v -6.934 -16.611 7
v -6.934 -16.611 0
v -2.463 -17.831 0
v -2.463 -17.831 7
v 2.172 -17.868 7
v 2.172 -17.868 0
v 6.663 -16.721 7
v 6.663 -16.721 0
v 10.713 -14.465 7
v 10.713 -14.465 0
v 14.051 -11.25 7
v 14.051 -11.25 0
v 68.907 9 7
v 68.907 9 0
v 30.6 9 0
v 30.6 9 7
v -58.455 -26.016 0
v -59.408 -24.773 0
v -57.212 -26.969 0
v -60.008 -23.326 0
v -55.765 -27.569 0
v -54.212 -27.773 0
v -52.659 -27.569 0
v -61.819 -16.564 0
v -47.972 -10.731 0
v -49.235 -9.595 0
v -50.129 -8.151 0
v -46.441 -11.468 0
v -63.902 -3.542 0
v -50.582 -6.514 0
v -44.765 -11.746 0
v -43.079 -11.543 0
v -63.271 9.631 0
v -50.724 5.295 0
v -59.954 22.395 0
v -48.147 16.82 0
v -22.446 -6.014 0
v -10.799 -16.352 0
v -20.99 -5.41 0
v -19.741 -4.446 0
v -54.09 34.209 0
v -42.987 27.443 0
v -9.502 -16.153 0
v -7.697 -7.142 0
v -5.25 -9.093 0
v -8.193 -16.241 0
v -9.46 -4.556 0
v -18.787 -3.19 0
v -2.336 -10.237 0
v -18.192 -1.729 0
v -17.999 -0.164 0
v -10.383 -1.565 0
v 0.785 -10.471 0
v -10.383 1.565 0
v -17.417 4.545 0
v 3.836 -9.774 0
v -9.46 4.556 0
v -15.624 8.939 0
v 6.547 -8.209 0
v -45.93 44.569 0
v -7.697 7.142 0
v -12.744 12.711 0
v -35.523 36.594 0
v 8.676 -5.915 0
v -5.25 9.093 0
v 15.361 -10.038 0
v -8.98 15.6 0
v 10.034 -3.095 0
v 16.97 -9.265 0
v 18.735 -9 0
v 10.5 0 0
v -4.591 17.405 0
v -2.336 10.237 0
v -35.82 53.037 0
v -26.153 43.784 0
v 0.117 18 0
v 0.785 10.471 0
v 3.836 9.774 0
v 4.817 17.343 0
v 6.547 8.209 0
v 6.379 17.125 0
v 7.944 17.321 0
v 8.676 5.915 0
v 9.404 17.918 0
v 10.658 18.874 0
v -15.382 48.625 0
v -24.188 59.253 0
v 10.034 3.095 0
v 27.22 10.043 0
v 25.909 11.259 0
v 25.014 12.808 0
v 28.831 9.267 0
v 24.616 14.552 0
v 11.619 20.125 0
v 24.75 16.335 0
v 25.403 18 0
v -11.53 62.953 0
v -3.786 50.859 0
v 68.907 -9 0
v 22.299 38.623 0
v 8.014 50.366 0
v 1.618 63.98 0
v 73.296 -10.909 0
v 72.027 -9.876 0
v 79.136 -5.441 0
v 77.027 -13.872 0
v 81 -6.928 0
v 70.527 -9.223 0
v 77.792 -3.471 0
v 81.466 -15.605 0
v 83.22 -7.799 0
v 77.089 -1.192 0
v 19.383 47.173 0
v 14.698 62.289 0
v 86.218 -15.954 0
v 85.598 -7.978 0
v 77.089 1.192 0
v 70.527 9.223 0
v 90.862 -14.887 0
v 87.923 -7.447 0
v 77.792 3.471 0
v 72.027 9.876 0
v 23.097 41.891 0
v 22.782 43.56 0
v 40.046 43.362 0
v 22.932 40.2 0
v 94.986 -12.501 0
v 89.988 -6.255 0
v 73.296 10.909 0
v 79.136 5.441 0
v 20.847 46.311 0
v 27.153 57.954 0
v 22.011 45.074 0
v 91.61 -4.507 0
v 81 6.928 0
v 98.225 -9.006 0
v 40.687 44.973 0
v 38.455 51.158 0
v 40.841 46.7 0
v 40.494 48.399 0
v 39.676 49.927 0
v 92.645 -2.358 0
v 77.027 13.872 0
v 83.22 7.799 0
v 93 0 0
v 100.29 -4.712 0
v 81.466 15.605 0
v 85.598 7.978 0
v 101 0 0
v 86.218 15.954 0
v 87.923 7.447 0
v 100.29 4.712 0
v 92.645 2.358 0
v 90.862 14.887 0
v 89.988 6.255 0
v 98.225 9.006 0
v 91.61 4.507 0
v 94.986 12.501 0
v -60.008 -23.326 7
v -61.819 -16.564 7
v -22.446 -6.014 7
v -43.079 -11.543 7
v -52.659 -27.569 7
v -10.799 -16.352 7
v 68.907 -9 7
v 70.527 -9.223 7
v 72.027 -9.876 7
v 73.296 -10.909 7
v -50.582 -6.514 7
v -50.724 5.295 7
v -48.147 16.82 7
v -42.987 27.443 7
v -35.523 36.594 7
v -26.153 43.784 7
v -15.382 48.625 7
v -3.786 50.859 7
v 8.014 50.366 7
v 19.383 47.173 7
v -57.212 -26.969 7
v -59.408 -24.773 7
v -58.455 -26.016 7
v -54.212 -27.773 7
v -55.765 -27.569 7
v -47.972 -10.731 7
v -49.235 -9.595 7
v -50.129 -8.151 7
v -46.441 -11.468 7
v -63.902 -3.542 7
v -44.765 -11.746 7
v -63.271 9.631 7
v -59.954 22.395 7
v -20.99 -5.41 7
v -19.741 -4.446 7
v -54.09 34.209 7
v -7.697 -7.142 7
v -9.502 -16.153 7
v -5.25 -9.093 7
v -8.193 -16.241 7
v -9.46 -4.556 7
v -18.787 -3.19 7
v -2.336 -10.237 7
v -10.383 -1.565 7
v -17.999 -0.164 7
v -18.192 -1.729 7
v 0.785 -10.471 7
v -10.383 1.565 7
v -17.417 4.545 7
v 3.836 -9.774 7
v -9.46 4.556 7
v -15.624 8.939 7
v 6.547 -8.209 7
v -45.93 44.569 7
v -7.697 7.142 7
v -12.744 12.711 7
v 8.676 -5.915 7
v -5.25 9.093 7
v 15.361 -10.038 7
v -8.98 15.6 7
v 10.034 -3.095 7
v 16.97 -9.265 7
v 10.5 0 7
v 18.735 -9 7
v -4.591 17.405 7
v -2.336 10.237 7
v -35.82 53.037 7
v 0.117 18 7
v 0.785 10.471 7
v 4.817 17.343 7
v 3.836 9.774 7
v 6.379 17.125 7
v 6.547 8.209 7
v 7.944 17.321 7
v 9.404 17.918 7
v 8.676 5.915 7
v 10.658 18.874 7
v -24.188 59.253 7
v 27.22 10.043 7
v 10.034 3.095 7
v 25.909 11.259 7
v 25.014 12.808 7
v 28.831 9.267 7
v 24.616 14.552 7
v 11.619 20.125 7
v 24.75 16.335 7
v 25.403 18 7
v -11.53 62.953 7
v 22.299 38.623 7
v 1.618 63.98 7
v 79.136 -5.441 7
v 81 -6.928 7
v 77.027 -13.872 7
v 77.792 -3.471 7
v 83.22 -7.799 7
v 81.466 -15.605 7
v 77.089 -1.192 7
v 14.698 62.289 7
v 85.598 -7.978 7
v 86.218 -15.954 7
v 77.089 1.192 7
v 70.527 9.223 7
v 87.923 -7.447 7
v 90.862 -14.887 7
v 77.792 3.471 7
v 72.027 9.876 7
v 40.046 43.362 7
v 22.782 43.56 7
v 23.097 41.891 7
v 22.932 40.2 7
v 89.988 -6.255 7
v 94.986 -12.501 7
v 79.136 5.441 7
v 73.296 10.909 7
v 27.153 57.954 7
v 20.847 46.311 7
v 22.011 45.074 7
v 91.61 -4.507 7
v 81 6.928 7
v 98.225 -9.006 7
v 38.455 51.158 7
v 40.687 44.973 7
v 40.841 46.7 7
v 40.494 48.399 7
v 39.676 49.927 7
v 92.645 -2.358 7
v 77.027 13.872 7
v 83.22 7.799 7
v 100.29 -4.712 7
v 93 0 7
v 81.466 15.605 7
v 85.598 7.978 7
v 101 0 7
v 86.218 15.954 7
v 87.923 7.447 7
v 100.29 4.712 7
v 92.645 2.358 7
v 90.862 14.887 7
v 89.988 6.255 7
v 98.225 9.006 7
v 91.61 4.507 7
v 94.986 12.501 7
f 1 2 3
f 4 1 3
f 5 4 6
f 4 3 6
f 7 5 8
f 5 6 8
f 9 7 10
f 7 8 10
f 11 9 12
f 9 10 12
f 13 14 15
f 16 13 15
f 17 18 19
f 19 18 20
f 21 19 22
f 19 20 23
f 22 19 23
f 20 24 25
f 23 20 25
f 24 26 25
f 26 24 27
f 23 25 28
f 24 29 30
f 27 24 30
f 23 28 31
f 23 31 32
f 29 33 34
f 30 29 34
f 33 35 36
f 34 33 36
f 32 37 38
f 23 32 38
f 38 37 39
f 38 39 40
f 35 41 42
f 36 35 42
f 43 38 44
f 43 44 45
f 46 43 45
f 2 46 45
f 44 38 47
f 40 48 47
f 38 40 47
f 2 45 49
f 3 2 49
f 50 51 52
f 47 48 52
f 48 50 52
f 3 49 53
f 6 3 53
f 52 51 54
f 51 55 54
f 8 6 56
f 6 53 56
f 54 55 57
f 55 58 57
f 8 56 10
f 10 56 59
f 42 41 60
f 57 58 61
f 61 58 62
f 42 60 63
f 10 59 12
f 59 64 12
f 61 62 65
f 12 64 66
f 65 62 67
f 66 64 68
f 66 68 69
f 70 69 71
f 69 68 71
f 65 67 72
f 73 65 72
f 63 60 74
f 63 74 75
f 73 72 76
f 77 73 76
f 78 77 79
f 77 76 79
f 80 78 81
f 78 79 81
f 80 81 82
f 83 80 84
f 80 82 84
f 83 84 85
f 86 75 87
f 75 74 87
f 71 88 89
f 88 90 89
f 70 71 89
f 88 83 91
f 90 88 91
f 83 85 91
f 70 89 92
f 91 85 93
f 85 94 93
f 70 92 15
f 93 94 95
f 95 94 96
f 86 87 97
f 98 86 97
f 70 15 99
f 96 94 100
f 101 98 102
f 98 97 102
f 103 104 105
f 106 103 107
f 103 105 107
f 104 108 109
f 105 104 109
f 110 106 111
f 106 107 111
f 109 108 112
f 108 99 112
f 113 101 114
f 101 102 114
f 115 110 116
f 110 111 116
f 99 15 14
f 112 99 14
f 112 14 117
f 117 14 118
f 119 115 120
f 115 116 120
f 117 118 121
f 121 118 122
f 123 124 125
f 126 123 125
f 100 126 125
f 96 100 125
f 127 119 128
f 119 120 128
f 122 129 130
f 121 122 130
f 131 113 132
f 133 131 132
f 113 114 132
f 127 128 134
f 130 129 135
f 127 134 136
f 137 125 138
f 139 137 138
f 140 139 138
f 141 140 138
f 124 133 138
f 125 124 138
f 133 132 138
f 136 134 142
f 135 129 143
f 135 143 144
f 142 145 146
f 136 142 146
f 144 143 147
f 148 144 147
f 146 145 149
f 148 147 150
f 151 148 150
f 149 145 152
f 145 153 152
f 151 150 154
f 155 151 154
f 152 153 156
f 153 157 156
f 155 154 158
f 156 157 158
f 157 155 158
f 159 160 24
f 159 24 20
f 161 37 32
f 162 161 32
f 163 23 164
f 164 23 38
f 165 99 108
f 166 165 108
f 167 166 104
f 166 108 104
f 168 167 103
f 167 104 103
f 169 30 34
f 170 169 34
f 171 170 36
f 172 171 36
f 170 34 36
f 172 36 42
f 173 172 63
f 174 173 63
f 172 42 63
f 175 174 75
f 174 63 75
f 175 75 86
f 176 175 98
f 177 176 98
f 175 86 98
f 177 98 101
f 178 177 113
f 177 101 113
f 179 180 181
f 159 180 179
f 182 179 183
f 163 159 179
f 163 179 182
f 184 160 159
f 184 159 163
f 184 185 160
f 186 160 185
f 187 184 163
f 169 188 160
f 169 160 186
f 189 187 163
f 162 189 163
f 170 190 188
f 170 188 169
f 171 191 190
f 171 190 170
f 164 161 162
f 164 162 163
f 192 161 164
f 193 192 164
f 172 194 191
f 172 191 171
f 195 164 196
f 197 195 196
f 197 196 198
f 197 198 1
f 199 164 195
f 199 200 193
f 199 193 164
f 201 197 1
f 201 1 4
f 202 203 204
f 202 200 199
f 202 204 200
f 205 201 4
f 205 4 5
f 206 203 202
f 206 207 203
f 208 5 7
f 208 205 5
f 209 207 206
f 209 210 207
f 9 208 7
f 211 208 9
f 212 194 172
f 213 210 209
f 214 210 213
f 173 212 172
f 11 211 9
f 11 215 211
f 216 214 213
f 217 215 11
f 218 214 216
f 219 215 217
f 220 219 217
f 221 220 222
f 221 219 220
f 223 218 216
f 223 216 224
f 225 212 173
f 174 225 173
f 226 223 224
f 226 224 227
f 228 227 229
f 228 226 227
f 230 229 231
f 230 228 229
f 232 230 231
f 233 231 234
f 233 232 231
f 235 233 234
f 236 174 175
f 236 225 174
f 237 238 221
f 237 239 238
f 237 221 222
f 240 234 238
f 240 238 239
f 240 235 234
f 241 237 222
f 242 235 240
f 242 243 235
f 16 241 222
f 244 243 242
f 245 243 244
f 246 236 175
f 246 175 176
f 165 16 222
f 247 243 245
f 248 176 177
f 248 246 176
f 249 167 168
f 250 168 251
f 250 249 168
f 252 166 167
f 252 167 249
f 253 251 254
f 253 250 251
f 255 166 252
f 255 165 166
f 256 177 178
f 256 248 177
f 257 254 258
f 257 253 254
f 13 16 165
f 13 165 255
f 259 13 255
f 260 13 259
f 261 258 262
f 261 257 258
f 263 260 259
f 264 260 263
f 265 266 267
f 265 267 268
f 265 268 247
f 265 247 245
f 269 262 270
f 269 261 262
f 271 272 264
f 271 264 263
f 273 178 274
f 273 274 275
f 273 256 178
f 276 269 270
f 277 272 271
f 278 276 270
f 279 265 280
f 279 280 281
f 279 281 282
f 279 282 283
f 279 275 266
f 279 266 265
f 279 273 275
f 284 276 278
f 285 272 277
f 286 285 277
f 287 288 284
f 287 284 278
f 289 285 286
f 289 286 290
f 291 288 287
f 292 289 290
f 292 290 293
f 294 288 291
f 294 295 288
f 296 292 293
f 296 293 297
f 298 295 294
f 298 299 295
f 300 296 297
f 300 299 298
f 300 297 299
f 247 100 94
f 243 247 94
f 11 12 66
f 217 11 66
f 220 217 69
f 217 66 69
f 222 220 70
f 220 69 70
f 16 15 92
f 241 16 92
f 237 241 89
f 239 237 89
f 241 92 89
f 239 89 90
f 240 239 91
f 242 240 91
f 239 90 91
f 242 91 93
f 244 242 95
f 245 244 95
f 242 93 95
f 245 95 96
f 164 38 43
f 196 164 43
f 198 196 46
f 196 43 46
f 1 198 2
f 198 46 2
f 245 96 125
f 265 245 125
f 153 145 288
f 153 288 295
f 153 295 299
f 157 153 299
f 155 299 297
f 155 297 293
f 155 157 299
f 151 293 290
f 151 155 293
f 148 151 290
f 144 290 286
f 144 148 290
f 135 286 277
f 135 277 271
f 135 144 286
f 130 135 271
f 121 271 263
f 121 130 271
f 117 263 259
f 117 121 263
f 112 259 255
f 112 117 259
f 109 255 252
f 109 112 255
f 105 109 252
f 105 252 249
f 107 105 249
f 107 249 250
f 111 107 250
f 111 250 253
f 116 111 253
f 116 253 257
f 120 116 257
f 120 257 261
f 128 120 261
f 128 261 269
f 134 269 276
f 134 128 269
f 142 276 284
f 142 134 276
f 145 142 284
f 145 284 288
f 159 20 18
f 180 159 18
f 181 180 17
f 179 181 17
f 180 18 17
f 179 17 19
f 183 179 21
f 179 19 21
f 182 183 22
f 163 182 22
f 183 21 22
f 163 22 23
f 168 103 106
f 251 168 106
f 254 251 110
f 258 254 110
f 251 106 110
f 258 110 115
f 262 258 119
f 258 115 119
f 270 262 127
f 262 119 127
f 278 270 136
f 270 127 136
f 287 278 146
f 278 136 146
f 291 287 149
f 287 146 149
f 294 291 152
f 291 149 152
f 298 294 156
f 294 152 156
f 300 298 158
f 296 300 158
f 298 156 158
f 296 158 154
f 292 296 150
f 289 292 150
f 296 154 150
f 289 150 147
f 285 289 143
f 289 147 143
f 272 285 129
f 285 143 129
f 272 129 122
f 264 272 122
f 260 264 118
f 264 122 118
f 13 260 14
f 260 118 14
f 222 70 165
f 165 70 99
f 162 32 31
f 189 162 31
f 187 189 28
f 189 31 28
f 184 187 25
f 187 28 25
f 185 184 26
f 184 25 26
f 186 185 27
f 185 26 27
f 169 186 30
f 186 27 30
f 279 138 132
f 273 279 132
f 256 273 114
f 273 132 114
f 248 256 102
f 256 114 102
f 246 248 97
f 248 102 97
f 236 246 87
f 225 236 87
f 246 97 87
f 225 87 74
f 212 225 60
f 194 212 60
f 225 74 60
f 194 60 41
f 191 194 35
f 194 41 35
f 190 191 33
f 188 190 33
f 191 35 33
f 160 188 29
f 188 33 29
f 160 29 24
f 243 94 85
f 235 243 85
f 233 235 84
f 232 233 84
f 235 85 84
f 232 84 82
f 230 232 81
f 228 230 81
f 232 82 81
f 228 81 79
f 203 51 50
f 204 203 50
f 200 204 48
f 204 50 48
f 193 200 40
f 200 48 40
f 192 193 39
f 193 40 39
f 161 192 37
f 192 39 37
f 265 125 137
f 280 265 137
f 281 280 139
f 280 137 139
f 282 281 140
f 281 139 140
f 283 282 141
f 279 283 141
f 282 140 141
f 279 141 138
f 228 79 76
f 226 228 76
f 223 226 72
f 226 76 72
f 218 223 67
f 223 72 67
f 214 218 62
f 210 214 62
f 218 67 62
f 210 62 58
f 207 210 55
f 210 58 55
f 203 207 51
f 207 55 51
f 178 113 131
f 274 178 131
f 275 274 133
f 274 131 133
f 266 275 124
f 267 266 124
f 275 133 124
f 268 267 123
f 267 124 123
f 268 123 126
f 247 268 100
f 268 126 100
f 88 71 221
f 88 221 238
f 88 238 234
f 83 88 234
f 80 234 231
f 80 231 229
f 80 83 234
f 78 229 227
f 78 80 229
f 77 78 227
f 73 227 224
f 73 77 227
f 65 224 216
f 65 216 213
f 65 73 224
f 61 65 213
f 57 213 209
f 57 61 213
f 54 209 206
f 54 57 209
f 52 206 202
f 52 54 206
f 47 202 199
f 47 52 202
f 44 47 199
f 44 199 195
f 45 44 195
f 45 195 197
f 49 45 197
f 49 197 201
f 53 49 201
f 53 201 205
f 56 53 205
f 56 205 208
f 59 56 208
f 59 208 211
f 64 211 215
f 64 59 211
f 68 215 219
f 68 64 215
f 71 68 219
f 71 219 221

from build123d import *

# Parameters (mm, degrees)
SKETCH1_R           = 10.5
SKETCH1_R_2         = 8
BOSS_EXTRUDE1_DEPTH = 7


with BuildPart() as part:
    # Sketch1 → Boss-Extrude1 (new body)
    with BuildSketch(Plane.XY):
        with BuildLine():
            Line((25.403411844, 18), (40.04634859, 43.362310416))
            ThreePointArc((40.04634859, 43.362310416), (40.729032534, 47.562011618), (38.455388874, 51.158411493))
            ThreePointArc((38.455388874, 51.158411493), (-35.819868425, 53.037128749), (-61.819252882, -16.564418887))
            Line((-61.819252882, -16.564418887), (-60.007519567, -23.325899671))
            ThreePointArc((-60.007519567, -23.325899671), (-57.211964609, -26.969137823), (-52.659050338, -27.568540358))
            Line((-52.659050338, -27.568540358), (-10.79860525, -16.352067901))
            ThreePointArc((-10.79860525, -16.352067901), (-8.844993295, -16.161017697), (-6.934268235, -16.610717144))
            ThreePointArc((-6.934268235, -16.610717144), (4.455015534, -17.439978113), (14.051245496, -11.25))
            ThreePointArc((14.051245496, -11.25), (16.136917784, -9.591673087), (18.734993995, -9))
            Line((18.734993995, -9), (68.906523061, -9))
            ThreePointArc((68.906523061, -9), (71.299695166, -9.497934272), (73.295653135, -10.909090909))
            ThreePointArc((73.295653135, -10.909090909), (101, 0), (73.295653135, 10.909090909))
            ThreePointArc((73.295653135, 10.909090909), (71.299695166, 9.497934272), (68.906523061, 9))
            Line((68.906523061, 9), (30.599564267, 9))
            ThreePointArc((30.599564267, 9), (25.403411844, 12), (25.403411844, 18))
        make_face()
        Circle(SKETCH1_R, mode=Mode.SUBTRACT)
        with Locations((85, 0)):
            Circle(SKETCH1_R_2, mode=Mode.SUBTRACT)
        with BuildLine():
            Line((-22.446087833, -6.014411108), (-43.078559215, -11.542865153))
            ThreePointArc((-43.078559215, -11.542865153), (-47.971955445, -10.731402919), (-50.582336617, -6.513618221))
            ThreePointArc((-50.582336617, -6.513618221), (-31.046832879, 40.461020355), (19.383344125, 47.172936845))
            ThreePointArc((19.383344125, 47.172936845), (22.781794932, 43.559859246), (22.299103121, 38.623179569))
            Line((22.299103121, 38.623179569), (11.618950039, 20.124611797))
            ThreePointArc((11.618950039, 20.124611797), (8.69359949, 17.570923037), (4.817098212, 17.343458848))
            ThreePointArc((4.817098212, 17.343458848), (-10.957705722, 14.280360125), (-17.999251578, -0.164142113))
            ThreePointArc((-17.999251578, -0.164142113), (-19.222277472, -3.849682749), (-22.446087833, -6.014411108))
        make_face(mode=Mode.SUBTRACT)
    extrude(amount=BOSS_EXTRUDE1_DEPTH)


solid = part.part
